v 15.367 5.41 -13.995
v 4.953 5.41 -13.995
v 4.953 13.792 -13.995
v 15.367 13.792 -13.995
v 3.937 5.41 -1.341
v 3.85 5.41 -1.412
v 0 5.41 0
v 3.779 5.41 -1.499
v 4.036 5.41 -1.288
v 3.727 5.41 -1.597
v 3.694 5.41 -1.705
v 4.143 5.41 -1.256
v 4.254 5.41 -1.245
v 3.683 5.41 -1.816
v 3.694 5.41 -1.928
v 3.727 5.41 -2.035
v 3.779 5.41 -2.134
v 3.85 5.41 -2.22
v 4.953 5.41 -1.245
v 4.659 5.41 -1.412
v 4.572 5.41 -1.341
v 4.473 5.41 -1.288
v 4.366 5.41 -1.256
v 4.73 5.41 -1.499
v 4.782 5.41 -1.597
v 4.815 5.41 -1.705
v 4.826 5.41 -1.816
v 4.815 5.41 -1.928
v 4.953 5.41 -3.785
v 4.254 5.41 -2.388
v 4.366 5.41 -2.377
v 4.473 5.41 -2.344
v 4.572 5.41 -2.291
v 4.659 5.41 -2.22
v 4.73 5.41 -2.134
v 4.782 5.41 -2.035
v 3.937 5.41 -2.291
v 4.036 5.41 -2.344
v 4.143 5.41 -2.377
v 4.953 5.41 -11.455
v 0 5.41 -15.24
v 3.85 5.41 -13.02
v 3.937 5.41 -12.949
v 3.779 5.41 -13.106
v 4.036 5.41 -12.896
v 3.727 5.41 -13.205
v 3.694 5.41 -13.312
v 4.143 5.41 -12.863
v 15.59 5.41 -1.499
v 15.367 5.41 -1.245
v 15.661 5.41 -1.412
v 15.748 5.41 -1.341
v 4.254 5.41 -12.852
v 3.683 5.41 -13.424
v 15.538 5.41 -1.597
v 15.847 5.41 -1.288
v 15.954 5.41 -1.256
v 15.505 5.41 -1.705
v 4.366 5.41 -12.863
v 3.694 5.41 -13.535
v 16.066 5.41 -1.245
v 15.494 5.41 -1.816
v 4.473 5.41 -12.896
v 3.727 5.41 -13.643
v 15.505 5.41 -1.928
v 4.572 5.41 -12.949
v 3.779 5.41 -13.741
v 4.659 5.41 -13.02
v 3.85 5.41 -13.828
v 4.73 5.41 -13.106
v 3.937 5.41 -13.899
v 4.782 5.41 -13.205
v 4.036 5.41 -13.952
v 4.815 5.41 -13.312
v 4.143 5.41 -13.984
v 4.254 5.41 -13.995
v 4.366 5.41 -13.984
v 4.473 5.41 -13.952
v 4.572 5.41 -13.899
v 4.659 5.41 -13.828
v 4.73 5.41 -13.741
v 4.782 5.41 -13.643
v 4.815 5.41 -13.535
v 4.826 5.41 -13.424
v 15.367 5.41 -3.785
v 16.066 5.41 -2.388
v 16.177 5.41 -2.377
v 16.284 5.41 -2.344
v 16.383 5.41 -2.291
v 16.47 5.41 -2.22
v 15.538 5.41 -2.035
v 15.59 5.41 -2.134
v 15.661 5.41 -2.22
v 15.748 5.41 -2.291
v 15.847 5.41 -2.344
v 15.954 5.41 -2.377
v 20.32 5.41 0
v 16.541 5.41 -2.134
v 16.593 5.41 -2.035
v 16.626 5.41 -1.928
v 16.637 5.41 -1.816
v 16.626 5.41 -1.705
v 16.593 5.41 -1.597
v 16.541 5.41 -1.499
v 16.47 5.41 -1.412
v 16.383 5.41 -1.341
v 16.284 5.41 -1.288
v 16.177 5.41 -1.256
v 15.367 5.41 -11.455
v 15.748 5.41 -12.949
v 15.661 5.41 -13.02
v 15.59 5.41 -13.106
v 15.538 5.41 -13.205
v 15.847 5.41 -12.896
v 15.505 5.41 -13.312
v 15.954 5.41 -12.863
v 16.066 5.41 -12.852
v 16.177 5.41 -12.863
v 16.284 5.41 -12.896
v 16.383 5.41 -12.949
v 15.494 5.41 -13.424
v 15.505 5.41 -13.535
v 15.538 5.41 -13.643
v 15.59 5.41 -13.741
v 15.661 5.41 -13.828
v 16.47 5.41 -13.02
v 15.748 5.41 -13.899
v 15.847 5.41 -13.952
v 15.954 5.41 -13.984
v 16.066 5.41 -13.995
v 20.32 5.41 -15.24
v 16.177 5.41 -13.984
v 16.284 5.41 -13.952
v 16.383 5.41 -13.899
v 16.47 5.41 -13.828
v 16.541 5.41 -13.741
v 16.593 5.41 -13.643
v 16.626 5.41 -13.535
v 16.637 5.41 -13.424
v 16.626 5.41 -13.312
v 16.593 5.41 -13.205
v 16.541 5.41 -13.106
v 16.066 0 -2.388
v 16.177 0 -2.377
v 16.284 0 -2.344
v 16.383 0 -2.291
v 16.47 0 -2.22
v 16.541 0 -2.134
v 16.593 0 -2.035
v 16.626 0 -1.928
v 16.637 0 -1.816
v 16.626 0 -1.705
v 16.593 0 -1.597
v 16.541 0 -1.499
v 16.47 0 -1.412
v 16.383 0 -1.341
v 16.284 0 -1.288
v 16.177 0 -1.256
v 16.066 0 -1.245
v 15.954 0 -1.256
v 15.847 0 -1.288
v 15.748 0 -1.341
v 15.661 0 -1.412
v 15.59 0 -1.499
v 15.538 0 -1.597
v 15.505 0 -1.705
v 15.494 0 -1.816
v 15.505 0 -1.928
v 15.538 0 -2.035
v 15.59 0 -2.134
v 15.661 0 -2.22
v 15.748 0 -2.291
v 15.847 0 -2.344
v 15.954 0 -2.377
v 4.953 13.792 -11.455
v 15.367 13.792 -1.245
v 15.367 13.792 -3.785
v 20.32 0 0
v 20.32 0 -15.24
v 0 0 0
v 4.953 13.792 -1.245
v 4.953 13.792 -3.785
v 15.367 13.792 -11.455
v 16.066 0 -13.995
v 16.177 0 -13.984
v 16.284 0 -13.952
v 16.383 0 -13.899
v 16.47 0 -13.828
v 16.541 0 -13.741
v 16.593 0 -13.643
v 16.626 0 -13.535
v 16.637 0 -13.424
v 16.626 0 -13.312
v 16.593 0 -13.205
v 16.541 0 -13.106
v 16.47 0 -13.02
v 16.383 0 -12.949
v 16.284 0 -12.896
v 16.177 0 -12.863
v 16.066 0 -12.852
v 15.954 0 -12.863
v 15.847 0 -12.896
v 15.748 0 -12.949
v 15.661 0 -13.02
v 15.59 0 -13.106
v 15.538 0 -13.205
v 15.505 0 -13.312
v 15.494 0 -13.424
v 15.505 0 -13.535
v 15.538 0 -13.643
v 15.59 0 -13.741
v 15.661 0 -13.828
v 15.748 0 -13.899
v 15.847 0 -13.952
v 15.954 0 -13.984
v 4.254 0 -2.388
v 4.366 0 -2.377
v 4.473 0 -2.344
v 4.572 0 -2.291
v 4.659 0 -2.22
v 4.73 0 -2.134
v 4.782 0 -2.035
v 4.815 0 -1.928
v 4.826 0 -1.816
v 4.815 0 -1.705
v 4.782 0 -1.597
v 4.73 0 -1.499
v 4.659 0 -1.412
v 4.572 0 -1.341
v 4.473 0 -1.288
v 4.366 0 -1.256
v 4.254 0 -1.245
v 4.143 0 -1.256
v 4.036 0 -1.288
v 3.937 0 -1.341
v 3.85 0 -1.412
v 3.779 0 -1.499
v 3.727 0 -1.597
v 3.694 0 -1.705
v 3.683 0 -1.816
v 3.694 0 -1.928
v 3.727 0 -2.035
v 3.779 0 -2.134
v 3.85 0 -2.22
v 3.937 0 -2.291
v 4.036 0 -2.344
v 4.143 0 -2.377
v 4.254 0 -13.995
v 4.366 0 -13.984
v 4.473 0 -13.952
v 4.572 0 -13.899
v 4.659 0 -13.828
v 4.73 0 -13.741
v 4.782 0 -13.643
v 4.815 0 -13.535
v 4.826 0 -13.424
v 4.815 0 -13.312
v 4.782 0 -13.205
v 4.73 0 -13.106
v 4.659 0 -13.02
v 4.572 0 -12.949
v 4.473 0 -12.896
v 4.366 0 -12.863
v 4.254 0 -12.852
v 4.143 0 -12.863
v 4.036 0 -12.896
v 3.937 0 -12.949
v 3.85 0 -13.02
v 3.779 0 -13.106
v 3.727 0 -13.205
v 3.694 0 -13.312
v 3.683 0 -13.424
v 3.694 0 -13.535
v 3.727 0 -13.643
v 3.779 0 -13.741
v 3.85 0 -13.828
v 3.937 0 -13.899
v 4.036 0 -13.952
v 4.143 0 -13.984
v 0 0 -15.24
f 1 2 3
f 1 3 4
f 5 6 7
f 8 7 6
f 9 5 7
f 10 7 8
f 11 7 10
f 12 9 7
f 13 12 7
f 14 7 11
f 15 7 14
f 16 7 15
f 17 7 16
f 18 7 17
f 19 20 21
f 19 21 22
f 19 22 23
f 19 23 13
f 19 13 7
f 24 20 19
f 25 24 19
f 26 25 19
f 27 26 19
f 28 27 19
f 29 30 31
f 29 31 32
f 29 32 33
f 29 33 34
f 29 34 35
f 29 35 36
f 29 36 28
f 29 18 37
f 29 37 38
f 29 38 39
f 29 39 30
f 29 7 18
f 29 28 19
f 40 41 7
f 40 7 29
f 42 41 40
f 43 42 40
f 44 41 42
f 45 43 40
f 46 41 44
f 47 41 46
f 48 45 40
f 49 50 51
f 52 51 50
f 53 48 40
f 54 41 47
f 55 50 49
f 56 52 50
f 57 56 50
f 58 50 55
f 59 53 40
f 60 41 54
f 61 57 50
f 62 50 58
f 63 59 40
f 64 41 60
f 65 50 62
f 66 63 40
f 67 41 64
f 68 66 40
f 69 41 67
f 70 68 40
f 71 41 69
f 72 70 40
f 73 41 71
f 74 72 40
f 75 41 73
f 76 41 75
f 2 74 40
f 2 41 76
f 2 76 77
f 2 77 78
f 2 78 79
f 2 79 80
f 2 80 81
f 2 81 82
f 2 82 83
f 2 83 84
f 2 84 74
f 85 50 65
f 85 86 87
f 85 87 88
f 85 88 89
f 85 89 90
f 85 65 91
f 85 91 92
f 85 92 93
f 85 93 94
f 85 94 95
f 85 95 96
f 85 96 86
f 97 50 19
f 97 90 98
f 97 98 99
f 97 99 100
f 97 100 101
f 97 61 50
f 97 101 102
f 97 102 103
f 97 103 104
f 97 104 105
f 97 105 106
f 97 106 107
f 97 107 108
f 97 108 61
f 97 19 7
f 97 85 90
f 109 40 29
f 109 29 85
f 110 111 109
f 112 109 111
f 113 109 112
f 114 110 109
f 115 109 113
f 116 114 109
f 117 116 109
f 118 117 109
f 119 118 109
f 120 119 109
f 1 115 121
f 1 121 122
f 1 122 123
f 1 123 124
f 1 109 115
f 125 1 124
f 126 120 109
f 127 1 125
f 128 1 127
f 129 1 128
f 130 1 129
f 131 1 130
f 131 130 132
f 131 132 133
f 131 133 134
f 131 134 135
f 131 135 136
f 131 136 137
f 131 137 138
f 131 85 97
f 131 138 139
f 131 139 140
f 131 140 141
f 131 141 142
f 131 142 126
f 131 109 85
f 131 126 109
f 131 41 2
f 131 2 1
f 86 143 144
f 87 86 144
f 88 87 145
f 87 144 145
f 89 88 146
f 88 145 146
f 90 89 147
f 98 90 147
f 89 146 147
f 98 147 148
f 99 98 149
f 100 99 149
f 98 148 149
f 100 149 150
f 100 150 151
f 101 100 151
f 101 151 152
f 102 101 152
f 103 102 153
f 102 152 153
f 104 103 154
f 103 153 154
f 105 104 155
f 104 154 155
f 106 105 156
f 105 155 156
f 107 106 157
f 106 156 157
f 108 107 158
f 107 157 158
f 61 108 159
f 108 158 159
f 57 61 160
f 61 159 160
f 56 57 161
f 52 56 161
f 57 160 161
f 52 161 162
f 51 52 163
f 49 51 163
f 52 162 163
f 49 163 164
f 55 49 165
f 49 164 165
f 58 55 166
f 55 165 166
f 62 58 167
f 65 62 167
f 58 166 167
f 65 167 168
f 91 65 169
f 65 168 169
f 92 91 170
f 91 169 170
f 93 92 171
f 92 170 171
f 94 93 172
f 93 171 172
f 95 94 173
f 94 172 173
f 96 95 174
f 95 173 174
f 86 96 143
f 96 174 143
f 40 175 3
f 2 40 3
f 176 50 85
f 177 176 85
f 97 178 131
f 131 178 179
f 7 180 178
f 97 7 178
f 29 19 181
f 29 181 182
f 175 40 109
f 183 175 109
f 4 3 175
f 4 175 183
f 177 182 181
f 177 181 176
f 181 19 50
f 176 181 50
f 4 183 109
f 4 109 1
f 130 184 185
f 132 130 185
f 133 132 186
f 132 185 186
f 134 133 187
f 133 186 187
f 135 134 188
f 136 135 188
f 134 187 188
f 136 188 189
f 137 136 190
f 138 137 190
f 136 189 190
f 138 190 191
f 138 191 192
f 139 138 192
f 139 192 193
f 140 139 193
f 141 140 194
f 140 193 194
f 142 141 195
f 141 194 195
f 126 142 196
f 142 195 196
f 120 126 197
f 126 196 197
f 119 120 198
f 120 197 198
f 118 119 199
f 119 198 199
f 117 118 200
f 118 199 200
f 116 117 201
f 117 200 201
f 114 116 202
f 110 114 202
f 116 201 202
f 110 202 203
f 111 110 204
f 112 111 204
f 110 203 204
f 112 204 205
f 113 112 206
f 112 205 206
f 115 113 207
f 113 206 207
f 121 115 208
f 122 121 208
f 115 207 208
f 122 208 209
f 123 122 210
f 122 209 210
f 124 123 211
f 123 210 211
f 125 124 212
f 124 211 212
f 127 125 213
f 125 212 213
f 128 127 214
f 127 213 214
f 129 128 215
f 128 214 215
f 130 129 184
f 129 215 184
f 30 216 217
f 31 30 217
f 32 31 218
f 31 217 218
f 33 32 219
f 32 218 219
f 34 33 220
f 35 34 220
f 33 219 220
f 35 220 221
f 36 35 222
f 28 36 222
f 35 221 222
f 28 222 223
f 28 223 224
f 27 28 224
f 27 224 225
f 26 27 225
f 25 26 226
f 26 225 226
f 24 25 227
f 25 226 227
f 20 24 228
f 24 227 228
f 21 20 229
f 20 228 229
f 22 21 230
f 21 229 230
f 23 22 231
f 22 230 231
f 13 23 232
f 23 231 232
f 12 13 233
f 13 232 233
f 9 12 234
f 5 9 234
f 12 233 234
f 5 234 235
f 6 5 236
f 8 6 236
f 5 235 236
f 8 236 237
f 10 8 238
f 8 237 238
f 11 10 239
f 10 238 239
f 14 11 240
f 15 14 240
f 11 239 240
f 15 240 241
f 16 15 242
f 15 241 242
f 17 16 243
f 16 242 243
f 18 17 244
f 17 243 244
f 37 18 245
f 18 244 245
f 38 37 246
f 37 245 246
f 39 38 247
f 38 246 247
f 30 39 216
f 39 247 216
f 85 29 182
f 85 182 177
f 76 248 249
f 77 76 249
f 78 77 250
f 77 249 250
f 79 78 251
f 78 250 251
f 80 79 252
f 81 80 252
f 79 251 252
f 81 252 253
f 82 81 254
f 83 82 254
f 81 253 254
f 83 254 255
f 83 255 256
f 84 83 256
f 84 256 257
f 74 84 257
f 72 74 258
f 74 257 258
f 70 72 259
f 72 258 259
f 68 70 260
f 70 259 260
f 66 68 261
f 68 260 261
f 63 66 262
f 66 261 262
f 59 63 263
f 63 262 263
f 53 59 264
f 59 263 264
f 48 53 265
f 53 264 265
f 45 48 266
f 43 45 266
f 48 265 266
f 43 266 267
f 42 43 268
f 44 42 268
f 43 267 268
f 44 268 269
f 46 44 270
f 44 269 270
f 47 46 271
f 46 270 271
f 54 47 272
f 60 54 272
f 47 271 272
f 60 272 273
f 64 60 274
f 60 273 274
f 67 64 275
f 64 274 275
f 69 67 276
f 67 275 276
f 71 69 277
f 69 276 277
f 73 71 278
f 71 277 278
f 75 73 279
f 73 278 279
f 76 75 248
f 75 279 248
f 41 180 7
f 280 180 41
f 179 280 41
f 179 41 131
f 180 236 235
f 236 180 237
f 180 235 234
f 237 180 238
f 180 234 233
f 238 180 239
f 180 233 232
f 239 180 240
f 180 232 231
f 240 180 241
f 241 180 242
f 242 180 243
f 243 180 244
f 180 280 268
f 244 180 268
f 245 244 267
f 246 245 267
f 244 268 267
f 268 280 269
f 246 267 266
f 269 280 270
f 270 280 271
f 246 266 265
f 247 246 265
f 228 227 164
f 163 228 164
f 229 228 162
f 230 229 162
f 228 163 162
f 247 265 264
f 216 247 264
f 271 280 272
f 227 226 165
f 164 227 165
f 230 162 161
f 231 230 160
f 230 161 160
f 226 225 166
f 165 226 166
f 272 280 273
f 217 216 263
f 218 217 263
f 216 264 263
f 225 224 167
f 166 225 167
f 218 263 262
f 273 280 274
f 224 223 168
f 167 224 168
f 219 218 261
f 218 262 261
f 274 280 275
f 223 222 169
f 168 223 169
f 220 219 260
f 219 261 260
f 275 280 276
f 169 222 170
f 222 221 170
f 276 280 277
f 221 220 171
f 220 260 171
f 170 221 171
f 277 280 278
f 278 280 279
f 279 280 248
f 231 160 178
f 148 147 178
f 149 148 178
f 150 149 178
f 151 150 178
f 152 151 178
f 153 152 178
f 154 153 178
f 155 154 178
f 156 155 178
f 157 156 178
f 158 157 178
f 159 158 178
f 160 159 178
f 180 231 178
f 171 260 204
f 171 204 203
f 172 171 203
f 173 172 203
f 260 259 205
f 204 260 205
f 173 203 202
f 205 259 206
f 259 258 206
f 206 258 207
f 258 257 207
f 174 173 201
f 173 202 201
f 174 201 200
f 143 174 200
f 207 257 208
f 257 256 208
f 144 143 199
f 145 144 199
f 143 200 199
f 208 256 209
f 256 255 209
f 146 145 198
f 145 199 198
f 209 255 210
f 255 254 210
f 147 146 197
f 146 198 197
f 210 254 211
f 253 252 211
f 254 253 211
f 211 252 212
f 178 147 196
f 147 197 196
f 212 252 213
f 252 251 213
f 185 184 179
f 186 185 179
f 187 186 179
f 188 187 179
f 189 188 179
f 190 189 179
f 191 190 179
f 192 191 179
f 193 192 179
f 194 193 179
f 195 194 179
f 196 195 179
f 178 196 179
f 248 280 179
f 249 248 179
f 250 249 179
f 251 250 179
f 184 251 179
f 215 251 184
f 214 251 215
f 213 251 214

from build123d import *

# Parameters (mm, degrees)
SKETCH1_W           = 20.32
SKETCH1_H           = 15.24
BOSS_EXTRUDE1_DEPTH = 5.4102
SKETCH2_W           = 10.414
SKETCH2_H           = 2.54
BOSS_EXTRUDE2_DEPTH = 8.382
SKETCH3_R           = 0.5715
CUT_EXTRUDE1_DEPTH  = 5.4102


with BuildPart() as part:
    # Sketch1 → Boss-Extrude1 (new body)
    with BuildSketch(Plane(origin=(0, 0, 0), x_dir=(1, 0, 0), z_dir=(0, 1, 0))):
        with Locations((10.16, 7.62)):
            Rectangle(SKETCH1_W, SKETCH1_H)
    extrude(amount=BOSS_EXTRUDE1_DEPTH)

    # Sketch2 → Boss-Extrude2 (add)
    with BuildSketch(Plane(origin=(0, 5.4102, 0), x_dir=(1, 0, 0), z_dir=(0, 1, 0))):
        with Locations((10.16, 12.7254)):
            Rectangle(SKETCH2_W, SKETCH2_H)
        with Locations((10.16, 2.5146)):
            Rectangle(SKETCH2_W, SKETCH2_H)
    extrude(amount=BOSS_EXTRUDE2_DEPTH)

    # Sketch3 → Cut-Extrude1 (cut)
    with BuildSketch(Plane.XZ):
        with Locations(Location((4.2545, -1.8161, 0), (0, 0, 270))):
            Circle(SKETCH3_R)
        with Locations(Location((16.0655, -1.8161, 0), (0, 0, 270))):
            Circle(SKETCH3_R)
        with Locations(Location((16.0655, -13.4239, 0), (0, 0, 270))):
            Circle(SKETCH3_R)
        with Locations(Location((4.2545, -13.4239, 0), (0, 0, 270))):
            Circle(SKETCH3_R)
    extrude(amount=-CUT_EXTRUDE1_DEPTH, mode=Mode.SUBTRACT)


solid = part.part
